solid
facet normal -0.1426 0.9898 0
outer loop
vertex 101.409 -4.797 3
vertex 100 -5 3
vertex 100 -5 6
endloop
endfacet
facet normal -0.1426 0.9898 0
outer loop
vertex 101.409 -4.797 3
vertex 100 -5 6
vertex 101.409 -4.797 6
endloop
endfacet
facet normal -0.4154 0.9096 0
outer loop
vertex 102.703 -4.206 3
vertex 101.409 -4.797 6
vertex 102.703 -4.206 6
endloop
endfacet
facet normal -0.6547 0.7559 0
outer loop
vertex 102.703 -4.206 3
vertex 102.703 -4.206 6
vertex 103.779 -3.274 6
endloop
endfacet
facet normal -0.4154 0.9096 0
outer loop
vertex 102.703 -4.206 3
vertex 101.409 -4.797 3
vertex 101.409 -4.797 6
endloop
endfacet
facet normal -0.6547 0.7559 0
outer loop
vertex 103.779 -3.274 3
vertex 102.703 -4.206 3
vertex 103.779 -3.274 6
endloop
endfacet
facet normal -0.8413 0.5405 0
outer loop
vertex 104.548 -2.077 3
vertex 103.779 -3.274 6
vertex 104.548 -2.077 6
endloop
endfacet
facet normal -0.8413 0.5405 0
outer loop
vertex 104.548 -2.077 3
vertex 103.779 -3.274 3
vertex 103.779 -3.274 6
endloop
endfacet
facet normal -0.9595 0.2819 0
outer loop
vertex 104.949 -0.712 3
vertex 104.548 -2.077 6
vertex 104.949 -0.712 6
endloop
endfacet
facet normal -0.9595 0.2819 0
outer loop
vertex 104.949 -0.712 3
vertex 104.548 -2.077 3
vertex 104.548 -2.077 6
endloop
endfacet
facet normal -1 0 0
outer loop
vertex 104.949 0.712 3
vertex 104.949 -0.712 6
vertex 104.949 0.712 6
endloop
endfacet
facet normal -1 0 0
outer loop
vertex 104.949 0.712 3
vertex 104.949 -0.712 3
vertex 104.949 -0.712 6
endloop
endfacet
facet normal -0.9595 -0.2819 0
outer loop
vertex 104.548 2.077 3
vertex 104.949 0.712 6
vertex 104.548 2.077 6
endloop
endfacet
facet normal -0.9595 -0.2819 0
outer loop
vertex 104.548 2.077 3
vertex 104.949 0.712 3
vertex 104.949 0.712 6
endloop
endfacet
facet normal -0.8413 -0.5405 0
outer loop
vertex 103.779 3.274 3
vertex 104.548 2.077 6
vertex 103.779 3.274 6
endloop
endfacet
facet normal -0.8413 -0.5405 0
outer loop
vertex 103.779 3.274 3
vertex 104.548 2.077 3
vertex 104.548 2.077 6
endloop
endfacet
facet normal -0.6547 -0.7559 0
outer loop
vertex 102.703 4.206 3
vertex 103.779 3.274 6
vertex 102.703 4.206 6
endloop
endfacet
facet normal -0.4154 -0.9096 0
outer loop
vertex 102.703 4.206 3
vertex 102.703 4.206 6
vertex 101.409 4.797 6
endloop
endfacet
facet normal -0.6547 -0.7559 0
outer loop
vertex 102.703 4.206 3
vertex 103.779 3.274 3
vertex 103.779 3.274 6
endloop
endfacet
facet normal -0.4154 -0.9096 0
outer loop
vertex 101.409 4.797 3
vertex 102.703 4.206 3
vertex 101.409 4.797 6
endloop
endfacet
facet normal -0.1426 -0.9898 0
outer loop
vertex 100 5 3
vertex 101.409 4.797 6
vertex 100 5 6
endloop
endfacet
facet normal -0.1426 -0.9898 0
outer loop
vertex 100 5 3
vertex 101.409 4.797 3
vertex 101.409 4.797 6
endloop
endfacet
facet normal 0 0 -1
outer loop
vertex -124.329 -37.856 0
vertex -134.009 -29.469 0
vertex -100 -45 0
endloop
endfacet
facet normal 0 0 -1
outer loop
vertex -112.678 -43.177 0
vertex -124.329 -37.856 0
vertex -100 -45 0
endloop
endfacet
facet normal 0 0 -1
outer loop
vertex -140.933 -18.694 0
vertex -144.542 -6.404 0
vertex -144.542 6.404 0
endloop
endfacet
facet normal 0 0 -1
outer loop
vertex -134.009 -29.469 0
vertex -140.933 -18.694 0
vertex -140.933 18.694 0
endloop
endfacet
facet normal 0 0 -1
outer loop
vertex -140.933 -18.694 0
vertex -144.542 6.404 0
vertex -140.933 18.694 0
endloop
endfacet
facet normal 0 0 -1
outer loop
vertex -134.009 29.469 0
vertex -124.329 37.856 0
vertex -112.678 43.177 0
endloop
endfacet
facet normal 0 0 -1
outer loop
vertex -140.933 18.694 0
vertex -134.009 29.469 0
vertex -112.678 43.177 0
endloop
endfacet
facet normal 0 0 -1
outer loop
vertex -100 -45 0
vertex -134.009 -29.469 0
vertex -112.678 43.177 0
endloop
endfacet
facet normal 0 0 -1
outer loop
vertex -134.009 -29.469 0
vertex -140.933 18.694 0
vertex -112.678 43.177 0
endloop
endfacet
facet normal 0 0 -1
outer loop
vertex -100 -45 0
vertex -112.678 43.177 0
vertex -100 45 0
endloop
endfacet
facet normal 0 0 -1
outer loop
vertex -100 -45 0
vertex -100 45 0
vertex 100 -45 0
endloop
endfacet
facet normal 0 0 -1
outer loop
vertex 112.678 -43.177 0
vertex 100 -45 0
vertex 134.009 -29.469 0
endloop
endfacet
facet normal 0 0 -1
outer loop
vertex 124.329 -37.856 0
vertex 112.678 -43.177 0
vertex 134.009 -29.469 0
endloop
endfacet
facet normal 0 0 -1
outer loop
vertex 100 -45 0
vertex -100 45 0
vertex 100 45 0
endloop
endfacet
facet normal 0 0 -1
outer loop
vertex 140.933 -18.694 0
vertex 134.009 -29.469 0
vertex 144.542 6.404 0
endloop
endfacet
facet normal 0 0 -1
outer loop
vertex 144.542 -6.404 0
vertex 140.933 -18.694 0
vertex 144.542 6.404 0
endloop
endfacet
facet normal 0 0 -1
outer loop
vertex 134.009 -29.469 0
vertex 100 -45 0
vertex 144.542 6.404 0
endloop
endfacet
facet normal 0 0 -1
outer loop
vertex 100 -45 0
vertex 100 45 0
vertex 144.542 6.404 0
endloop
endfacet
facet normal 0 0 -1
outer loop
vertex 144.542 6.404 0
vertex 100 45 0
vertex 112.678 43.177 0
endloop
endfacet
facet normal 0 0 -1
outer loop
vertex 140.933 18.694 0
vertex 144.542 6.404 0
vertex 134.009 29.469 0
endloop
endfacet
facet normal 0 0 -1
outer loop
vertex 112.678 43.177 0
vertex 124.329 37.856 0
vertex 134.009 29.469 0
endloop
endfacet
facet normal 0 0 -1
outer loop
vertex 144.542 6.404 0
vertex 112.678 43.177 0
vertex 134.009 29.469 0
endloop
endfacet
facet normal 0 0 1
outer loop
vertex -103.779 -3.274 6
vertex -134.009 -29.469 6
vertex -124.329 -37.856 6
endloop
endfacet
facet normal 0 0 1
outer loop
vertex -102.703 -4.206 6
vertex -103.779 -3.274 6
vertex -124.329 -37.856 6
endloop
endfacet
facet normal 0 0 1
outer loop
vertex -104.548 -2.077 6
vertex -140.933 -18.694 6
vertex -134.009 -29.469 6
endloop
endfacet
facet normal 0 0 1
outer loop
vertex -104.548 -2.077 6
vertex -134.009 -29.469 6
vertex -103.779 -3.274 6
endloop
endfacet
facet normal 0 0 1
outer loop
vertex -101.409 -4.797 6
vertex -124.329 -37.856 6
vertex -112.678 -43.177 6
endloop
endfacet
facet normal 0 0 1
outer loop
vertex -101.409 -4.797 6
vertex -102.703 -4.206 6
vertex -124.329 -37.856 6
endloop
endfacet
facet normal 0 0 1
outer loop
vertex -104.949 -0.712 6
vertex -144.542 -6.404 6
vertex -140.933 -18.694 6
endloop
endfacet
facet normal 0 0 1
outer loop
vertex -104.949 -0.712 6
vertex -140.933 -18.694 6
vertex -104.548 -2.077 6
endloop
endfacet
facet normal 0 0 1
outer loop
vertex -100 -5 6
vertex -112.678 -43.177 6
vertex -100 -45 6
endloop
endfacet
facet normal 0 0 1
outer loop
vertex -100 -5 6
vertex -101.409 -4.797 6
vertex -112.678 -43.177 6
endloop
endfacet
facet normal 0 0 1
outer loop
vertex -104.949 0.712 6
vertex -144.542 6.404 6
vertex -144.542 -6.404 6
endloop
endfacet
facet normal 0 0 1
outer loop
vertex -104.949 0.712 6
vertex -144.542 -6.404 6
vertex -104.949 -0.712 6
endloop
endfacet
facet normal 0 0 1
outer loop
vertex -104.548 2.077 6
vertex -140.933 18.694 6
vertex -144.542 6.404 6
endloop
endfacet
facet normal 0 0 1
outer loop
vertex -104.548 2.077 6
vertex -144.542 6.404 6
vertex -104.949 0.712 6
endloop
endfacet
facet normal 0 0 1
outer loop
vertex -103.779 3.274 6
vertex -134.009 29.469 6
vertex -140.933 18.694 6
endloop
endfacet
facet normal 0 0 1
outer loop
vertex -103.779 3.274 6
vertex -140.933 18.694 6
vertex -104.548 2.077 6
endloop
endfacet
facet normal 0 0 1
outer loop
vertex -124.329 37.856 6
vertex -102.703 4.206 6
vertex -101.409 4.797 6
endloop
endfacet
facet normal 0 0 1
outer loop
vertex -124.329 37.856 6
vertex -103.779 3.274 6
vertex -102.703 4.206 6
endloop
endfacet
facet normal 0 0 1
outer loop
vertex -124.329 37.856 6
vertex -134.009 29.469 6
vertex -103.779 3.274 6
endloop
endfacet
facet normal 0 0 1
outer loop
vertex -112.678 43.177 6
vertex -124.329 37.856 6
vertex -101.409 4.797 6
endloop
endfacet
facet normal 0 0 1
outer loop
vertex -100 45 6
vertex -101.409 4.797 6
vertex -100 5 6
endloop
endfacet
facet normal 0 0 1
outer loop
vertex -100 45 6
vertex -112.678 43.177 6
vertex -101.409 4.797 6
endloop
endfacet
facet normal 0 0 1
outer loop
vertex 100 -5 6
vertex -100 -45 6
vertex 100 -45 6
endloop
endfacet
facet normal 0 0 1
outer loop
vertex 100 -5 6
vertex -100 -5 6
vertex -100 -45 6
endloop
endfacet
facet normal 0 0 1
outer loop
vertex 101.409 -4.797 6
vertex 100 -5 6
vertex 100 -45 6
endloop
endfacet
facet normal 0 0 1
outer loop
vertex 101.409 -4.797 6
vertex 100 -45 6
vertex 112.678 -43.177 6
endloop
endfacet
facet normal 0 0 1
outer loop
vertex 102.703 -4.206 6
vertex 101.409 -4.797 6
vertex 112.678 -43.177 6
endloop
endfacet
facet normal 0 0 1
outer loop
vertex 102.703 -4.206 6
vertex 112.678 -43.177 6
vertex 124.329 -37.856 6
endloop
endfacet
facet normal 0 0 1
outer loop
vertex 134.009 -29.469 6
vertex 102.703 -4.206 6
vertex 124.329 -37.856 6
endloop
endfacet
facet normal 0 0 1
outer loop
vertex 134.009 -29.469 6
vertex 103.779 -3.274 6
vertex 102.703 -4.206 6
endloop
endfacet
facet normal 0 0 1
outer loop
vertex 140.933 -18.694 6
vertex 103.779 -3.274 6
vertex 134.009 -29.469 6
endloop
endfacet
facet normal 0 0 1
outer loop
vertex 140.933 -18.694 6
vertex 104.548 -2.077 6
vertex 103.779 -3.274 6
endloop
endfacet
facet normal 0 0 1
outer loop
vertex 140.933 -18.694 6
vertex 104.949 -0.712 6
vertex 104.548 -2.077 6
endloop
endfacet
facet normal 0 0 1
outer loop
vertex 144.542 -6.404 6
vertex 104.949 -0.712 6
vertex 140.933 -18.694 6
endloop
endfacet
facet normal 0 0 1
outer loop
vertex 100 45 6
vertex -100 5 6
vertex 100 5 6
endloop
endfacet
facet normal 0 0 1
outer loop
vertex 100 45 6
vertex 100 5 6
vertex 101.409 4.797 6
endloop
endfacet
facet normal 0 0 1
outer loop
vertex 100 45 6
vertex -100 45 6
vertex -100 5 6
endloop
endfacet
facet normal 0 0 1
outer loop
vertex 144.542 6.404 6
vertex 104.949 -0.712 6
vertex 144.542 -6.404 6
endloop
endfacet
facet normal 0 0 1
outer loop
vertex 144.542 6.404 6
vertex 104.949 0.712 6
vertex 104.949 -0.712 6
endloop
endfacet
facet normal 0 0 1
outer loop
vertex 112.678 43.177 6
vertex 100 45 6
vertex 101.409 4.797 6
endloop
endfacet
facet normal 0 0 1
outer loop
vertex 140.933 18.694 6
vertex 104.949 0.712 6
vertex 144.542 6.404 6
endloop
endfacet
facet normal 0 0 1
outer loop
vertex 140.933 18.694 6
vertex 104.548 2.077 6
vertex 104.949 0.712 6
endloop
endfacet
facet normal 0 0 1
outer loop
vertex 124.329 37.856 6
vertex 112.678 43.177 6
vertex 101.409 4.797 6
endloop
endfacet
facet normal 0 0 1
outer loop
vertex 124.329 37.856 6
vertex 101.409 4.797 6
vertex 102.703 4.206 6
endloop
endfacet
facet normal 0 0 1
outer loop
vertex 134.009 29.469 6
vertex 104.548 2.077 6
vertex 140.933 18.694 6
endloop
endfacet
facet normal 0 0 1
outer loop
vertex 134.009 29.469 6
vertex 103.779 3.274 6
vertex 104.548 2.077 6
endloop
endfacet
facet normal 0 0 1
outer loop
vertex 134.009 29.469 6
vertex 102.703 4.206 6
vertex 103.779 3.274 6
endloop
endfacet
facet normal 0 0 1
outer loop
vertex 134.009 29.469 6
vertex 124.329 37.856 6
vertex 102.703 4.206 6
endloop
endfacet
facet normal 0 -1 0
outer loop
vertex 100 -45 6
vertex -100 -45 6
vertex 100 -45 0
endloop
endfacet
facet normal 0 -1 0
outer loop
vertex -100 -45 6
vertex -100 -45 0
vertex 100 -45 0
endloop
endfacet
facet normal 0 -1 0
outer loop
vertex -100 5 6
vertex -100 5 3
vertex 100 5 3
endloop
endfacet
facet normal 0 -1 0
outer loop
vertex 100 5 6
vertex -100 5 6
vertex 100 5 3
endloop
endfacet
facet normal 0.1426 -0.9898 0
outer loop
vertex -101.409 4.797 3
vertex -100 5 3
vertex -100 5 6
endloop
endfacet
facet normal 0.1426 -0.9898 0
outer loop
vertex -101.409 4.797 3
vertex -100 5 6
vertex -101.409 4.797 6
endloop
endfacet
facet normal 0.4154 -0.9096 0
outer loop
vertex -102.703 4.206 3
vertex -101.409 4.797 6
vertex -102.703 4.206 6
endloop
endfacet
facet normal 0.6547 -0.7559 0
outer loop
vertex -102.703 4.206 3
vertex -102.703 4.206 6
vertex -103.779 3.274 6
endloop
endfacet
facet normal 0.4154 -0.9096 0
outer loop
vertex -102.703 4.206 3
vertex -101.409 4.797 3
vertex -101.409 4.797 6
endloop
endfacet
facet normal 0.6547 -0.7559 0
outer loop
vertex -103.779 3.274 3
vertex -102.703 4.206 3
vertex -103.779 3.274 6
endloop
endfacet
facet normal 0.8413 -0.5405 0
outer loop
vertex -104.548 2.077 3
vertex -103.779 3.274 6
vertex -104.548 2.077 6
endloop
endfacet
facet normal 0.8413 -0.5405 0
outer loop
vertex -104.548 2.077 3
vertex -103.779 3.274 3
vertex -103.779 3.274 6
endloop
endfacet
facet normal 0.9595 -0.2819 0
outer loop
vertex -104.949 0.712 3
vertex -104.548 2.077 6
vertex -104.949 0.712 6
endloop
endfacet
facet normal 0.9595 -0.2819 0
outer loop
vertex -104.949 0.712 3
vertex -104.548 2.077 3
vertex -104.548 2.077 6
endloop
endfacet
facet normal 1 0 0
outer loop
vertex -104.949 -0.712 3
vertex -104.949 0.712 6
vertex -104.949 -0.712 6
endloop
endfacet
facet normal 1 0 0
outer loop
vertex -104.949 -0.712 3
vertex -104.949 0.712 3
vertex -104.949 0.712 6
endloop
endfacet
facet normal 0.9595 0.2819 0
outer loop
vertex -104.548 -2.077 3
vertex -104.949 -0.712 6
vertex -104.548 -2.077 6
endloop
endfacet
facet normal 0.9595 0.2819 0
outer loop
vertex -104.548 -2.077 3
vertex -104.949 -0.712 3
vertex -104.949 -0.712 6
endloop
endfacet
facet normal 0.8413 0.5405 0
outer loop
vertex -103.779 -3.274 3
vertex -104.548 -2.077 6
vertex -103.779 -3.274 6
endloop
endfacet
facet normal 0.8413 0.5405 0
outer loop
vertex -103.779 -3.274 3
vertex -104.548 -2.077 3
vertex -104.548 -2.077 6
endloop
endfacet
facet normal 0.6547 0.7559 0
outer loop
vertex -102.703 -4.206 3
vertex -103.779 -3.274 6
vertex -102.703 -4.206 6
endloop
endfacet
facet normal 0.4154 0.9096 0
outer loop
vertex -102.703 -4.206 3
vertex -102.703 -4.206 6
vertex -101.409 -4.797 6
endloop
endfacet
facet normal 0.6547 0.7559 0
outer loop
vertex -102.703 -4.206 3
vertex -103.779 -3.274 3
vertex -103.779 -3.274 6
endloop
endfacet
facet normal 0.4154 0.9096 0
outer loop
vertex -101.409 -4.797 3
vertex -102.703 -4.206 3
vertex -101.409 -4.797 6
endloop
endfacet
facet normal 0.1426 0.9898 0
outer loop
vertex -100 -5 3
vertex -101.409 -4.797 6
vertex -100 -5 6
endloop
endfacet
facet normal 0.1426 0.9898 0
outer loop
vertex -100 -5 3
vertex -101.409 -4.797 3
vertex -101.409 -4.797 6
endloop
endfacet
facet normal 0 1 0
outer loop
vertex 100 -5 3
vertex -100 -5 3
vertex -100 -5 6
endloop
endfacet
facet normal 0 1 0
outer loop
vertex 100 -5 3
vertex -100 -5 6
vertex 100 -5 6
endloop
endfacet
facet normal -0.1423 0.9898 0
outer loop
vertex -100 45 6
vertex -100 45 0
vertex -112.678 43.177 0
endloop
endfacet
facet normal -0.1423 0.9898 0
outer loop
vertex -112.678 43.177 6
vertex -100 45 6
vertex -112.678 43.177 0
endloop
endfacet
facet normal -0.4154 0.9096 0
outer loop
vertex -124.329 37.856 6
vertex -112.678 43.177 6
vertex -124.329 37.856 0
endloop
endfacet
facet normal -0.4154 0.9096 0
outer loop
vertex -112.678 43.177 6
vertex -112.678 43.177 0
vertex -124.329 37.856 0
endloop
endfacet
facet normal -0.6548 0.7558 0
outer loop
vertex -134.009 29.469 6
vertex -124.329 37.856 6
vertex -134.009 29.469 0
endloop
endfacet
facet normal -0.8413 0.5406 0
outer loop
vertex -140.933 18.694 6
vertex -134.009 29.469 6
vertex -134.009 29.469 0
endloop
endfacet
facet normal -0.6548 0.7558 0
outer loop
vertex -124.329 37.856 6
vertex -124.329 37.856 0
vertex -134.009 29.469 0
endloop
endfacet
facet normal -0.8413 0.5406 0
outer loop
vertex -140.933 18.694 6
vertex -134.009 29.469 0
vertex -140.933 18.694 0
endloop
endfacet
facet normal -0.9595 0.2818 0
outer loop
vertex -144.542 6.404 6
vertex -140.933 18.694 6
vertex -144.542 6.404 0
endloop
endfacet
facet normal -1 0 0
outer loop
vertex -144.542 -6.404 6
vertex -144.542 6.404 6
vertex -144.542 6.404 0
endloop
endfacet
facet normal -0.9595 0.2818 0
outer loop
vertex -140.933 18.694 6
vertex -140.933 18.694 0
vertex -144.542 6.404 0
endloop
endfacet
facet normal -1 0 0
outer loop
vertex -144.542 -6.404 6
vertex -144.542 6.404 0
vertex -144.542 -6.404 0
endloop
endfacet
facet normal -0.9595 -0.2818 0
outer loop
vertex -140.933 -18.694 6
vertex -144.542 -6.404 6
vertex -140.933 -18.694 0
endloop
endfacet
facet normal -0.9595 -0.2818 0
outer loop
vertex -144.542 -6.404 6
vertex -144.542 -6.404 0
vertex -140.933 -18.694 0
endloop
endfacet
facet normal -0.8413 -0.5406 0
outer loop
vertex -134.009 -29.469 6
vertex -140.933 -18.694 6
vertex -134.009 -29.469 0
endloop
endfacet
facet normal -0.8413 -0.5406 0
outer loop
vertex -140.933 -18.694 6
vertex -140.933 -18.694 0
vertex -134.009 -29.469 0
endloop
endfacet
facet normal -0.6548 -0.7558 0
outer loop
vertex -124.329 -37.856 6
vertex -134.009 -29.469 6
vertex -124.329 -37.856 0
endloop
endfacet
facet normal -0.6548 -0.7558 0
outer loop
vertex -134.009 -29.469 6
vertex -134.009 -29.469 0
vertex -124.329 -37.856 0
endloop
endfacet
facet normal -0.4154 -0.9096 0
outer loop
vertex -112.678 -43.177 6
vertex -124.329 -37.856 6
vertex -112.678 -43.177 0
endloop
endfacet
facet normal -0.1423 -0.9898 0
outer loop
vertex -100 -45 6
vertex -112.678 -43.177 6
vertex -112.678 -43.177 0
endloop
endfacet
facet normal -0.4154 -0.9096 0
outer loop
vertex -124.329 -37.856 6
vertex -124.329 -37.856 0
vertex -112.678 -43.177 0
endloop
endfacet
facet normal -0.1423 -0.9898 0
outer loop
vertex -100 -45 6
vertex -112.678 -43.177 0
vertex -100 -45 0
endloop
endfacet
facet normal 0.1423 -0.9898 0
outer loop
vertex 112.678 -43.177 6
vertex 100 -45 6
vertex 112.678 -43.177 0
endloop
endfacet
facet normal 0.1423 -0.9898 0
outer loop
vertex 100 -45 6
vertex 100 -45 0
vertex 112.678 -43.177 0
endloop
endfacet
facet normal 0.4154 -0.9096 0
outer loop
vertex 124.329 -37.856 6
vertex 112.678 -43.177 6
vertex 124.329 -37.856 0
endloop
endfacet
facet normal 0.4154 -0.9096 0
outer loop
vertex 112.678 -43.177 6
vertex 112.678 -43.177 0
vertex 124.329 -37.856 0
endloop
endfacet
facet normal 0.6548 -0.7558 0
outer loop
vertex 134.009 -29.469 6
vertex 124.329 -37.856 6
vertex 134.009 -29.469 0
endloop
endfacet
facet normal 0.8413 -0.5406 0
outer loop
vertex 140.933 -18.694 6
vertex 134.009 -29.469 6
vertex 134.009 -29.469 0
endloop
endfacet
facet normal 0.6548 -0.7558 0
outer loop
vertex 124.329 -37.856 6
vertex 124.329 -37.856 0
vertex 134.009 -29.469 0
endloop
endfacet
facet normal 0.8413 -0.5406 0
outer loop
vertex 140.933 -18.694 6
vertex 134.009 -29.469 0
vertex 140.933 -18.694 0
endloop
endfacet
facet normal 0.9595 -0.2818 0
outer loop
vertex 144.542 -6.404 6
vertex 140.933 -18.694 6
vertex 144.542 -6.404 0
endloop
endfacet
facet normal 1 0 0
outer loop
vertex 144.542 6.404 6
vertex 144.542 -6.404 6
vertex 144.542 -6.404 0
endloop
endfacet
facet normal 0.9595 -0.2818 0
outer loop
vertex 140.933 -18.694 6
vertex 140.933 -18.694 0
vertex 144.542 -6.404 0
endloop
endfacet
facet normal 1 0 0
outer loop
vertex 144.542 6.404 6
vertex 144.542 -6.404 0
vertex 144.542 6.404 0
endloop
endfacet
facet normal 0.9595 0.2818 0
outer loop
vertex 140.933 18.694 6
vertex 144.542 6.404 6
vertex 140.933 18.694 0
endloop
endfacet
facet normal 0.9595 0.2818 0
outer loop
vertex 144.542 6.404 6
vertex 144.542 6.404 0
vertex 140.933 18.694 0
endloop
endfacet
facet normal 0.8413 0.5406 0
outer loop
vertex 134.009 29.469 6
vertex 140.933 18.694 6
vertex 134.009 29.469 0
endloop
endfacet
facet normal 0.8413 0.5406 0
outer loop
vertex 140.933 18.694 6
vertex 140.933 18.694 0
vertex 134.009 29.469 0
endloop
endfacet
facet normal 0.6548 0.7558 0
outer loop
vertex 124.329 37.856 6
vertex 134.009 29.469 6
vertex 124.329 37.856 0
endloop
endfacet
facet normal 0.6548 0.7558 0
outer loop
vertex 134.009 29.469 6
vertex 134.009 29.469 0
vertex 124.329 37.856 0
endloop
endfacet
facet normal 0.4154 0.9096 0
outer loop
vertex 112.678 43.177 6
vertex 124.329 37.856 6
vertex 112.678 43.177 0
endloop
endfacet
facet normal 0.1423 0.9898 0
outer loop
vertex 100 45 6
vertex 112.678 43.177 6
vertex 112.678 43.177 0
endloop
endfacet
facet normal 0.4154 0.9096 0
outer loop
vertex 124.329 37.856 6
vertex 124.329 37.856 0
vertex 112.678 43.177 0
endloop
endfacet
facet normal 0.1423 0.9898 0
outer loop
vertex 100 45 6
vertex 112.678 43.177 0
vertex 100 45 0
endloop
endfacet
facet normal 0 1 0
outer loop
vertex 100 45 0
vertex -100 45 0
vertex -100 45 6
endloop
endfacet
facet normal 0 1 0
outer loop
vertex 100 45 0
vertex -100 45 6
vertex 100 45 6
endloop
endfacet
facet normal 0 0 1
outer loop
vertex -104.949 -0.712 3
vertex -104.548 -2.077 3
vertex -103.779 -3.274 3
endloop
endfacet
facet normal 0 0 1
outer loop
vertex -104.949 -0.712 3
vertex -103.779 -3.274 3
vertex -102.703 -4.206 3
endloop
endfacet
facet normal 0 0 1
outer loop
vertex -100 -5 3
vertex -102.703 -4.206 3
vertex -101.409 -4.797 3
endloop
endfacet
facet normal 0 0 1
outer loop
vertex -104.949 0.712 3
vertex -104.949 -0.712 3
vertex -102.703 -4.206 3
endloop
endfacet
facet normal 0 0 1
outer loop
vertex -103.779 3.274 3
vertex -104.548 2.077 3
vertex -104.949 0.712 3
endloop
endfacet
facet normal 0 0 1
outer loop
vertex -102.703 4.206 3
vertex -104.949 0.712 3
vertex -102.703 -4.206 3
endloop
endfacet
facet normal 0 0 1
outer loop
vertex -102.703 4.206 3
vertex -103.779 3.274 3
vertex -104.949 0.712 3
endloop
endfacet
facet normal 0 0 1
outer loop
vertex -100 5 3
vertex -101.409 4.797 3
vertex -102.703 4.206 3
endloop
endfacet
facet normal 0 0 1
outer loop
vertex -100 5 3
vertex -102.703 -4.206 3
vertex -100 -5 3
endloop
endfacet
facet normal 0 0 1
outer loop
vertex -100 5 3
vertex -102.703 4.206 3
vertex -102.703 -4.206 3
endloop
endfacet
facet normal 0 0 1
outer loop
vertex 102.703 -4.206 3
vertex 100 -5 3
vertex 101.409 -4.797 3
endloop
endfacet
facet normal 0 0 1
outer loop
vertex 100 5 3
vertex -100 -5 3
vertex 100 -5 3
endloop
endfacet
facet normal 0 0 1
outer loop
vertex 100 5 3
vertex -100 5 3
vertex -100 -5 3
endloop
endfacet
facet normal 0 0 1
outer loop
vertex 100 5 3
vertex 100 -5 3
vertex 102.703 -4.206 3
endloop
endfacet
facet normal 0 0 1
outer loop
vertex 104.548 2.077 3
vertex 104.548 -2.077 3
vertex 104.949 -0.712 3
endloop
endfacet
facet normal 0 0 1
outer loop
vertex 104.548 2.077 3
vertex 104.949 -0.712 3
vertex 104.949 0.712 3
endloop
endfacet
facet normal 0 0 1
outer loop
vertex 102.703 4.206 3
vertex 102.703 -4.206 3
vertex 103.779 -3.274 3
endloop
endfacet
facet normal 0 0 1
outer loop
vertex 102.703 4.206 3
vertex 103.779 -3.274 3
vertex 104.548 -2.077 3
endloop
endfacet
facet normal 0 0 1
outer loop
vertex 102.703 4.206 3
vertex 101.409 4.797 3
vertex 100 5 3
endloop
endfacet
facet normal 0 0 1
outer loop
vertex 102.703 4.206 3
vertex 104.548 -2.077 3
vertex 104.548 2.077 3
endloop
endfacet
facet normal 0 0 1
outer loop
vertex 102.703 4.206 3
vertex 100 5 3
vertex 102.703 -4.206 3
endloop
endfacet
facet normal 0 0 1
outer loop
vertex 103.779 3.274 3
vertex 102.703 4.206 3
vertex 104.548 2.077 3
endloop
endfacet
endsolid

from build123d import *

# Parameters (mm, degrees)
PAD_DEPTH    = 3
PAD001_DEPTH = 3


with BuildPart() as part:
    # Sketch → Pad (new body)
    with BuildSketch(Plane.XY):
        with BuildLine():
            ThreePointArc((-100, 45), (-145, 0), (-100, -45))
            Line((-100, -45), (100, -45))
            ThreePointArc((100, -45), (145, 0), (100, 45))
            Line((-100, 45), (100, 45))
        make_face()
    extrude(amount=PAD_DEPTH)

    # Sketch001 (on Face6 of Pad) → Pad001 (join)
    with BuildSketch(Plane.XY.offset(3)):
        with BuildLine():
            ThreePointArc((-100, 45), (-145, 0), (-100, -45))
            Line((-100, -45), (100, -45))
            ThreePointArc((100, -45), (145, 0), (100, 45))
            Line((-100, 45), (100, 45))
        make_face()
        with BuildLine():
            ThreePointArc((-100, 5), (-105, 0), (-100, -5))
            Line((-100, -5), (100, -5))
            ThreePointArc((100, -5), (105, 0), (100, 5))
            Line((-100, 5), (100, 5))
        make_face(mode=Mode.SUBTRACT)
    extrude(amount=PAD001_DEPTH)


solid = part.part
